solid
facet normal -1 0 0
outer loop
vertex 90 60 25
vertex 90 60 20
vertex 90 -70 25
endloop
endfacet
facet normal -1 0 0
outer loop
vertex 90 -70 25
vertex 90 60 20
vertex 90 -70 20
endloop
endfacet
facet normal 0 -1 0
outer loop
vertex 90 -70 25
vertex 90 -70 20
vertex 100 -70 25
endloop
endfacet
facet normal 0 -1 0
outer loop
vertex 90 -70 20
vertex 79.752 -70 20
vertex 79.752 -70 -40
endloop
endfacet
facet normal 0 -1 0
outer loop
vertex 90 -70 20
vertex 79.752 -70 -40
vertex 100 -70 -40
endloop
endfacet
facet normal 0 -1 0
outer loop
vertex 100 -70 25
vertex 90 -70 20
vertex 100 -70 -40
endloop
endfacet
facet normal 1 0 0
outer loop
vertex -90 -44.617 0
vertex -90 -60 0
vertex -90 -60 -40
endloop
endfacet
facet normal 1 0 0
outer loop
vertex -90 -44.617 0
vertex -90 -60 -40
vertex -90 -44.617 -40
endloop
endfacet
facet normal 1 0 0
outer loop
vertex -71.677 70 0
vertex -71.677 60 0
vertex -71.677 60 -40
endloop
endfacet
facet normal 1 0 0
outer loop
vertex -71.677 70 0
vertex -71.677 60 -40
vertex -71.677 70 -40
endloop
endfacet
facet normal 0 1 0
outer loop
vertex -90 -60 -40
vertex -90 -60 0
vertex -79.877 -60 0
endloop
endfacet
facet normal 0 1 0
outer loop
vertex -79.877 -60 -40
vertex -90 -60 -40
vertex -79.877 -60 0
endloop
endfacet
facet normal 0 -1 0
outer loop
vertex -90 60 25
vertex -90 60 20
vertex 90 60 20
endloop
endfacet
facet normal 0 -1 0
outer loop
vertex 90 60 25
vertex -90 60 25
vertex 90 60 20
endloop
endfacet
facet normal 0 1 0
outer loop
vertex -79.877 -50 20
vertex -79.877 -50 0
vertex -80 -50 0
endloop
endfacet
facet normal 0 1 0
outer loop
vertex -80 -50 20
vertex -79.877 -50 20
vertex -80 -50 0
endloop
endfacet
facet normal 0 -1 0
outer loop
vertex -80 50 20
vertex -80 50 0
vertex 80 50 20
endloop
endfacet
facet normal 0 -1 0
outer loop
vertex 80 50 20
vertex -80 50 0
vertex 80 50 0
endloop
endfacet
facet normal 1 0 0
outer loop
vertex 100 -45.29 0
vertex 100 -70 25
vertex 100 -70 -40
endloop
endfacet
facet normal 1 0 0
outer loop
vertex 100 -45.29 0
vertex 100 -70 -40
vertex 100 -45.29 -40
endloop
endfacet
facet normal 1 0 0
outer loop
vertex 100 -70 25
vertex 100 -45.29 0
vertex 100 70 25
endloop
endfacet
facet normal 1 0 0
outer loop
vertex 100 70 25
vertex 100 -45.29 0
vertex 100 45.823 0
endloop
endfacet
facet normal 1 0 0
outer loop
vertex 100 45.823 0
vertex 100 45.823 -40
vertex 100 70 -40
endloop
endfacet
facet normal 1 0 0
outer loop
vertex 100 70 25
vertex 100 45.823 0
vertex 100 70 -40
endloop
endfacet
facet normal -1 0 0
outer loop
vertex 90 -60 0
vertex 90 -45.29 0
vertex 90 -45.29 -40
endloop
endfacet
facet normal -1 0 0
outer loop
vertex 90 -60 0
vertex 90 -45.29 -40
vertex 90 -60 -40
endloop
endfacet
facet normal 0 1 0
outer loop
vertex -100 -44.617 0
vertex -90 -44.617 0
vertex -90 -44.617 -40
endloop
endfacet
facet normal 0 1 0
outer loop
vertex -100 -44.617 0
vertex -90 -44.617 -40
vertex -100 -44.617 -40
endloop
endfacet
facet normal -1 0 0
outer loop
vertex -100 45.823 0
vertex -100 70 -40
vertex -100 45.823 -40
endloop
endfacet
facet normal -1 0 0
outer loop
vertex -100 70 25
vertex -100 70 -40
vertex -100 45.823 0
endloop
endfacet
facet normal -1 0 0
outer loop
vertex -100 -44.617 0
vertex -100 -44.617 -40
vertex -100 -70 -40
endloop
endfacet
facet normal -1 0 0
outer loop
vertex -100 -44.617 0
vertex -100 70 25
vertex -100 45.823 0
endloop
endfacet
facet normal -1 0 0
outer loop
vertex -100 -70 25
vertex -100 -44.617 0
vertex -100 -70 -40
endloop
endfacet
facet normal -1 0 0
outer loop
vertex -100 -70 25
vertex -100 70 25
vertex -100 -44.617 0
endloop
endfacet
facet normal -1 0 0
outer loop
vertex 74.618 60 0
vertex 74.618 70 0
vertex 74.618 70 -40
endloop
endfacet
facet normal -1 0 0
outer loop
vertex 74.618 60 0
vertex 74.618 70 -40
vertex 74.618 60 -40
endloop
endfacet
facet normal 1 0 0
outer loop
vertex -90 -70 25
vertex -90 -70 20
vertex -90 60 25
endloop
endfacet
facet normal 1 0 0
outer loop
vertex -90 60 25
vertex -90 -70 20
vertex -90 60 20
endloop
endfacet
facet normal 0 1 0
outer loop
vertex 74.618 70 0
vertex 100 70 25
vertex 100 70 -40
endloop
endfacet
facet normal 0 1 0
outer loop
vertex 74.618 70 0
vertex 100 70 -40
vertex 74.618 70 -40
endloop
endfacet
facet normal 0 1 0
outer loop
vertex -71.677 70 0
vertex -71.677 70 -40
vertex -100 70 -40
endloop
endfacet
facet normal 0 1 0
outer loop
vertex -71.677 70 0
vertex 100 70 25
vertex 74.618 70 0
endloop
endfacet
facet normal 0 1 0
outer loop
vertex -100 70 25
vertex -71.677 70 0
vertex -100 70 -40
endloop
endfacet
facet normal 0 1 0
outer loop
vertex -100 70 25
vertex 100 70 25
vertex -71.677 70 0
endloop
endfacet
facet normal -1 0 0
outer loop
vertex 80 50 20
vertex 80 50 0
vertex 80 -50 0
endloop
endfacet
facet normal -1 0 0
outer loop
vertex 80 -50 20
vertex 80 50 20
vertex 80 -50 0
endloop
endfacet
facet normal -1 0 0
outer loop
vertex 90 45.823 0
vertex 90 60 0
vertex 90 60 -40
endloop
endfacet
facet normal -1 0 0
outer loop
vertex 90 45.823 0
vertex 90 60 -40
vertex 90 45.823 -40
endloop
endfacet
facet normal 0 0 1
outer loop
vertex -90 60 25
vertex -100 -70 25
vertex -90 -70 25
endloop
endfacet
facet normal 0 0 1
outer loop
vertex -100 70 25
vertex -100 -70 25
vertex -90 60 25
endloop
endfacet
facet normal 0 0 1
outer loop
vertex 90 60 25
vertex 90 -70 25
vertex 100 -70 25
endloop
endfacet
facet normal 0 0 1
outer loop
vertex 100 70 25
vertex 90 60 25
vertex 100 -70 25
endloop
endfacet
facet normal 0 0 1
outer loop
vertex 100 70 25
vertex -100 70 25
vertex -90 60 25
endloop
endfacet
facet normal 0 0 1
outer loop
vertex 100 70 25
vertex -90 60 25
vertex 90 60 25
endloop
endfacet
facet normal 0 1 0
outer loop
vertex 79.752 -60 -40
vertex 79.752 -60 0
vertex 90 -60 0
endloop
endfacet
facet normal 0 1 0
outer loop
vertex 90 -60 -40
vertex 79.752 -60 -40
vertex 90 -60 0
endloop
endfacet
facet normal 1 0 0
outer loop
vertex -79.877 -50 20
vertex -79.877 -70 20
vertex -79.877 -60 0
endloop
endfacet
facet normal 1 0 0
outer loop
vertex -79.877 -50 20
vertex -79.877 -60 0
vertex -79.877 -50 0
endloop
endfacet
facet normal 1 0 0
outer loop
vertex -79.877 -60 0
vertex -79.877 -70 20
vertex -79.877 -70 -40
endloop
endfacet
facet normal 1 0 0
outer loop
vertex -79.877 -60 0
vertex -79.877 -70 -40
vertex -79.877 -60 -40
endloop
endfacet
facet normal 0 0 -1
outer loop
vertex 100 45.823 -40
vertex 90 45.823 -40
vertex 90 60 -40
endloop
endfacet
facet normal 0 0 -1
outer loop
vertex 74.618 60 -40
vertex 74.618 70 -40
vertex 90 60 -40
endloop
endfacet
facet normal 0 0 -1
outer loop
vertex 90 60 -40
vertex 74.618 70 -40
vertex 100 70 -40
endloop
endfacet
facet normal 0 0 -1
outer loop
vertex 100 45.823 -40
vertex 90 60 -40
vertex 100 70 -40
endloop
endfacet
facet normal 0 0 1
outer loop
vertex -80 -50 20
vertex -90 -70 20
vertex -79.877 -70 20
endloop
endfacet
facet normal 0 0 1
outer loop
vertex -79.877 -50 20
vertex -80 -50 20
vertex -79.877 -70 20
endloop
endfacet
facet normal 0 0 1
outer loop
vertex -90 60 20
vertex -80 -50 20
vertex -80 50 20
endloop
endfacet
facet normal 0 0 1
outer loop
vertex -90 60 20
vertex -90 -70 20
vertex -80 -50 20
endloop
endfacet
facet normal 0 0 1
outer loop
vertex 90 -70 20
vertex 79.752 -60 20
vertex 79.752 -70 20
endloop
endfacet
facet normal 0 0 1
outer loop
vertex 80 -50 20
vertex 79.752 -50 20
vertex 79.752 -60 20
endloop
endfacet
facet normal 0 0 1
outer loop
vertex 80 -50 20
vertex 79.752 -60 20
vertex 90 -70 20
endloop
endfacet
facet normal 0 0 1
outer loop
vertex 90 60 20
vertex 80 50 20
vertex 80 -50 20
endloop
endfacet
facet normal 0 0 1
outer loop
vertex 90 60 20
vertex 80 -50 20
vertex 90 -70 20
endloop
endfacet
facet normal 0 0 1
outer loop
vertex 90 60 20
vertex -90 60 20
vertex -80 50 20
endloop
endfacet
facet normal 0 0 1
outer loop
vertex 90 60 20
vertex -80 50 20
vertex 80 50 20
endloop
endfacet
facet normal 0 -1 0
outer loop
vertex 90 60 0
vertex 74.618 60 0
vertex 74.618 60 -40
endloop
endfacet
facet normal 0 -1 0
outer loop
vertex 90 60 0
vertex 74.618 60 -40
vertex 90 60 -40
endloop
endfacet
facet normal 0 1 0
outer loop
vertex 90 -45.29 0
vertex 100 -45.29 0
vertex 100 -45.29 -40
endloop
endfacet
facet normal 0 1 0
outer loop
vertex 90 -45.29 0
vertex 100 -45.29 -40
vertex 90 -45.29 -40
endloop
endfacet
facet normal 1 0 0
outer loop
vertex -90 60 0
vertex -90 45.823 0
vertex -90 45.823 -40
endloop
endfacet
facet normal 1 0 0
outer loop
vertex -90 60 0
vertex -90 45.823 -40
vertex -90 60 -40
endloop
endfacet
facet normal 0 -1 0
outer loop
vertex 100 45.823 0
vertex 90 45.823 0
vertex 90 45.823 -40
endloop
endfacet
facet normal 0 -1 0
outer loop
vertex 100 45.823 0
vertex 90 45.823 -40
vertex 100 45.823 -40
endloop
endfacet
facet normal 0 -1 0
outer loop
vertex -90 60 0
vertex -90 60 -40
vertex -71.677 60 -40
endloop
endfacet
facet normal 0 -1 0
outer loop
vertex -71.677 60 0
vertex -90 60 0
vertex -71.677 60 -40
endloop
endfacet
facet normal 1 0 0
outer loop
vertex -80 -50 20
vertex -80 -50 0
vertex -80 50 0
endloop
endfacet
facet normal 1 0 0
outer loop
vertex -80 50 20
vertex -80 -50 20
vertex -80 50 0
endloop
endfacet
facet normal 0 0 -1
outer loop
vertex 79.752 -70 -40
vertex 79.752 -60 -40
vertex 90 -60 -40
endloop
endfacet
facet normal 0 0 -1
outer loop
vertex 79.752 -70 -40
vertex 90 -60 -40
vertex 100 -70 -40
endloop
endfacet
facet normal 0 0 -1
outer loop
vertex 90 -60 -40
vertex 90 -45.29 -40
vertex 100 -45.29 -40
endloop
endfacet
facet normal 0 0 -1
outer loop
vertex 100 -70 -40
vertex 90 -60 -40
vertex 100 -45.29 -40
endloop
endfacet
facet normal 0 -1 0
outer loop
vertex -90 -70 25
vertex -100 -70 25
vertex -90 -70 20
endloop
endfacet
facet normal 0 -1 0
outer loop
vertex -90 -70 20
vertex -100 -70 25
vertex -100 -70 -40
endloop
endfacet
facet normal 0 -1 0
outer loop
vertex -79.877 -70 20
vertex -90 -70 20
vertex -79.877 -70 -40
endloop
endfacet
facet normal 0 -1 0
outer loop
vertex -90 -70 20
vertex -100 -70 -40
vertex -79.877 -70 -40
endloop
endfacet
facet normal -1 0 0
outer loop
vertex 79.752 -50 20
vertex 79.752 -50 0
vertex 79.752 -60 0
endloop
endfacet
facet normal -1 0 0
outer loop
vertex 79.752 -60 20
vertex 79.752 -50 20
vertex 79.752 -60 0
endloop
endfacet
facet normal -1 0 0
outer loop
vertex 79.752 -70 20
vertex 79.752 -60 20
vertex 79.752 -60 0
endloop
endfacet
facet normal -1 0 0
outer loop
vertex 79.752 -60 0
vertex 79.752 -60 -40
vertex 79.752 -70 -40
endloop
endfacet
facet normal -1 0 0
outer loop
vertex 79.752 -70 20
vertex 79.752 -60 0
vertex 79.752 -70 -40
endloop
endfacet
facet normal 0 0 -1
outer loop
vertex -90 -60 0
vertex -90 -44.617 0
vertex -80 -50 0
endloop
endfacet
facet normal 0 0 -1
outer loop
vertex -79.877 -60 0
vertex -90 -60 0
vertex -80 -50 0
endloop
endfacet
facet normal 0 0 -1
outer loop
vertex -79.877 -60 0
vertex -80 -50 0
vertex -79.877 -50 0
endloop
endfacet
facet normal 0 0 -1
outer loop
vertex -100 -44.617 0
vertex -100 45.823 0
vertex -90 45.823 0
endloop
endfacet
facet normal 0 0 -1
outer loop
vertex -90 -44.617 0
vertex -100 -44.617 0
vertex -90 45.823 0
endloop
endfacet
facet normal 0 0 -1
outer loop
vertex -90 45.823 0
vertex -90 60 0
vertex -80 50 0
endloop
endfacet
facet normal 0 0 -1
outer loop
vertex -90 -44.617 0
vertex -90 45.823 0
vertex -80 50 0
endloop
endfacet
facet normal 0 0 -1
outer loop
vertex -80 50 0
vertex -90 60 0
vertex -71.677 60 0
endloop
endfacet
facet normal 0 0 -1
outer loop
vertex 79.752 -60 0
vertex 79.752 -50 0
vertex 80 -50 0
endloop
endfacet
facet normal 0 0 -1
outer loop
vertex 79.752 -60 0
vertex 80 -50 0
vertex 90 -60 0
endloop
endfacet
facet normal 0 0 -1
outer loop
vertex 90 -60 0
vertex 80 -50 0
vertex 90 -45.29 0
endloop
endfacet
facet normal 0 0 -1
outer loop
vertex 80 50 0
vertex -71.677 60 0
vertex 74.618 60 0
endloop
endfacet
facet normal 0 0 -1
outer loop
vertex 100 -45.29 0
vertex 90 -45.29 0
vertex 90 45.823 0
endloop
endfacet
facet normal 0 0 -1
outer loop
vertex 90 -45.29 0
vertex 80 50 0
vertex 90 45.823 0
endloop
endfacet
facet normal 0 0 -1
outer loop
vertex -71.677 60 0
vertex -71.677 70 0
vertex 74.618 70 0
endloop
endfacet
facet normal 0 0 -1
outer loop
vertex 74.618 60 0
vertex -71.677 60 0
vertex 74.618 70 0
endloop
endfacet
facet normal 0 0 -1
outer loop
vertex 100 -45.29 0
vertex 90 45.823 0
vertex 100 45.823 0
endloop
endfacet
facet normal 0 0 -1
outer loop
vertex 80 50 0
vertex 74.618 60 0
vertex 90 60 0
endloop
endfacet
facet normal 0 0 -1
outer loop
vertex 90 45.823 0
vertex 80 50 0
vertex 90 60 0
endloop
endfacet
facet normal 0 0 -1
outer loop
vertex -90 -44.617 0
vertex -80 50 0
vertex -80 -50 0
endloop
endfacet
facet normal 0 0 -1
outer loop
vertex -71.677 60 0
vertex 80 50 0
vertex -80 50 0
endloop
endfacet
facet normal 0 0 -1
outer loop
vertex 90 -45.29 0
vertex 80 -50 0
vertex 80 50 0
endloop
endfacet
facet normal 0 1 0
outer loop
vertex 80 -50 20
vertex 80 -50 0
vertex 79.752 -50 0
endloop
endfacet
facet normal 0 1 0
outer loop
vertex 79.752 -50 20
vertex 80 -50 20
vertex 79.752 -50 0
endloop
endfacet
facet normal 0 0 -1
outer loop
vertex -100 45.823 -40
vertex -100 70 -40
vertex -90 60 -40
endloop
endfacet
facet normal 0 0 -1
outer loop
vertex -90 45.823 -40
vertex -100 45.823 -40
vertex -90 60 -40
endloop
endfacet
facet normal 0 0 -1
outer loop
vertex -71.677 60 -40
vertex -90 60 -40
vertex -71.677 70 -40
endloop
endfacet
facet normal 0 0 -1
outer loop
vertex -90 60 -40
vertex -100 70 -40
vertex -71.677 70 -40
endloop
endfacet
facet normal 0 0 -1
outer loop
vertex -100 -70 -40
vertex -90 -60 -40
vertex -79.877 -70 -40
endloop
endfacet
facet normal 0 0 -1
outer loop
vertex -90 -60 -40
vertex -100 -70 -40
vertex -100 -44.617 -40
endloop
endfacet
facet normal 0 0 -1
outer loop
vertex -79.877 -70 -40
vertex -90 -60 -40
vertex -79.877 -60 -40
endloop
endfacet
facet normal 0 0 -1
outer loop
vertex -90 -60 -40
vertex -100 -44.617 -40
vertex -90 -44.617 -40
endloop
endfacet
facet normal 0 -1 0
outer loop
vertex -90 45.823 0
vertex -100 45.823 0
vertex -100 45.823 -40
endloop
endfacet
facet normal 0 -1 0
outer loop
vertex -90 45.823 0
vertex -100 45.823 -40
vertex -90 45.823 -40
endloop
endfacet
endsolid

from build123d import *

# Parameters (mm, degrees)
F0_W     = 10
F0_H     = 91.1132134497
F0_W_2   = 10.2482907567
F0_H_2   = 10
F0_W_3   = 10.1232041232
F0_H_3   = 90.4400162399
F0_W_4   = 146.2950482965
F1_DEPTH = 20
F2_DEPTH = 25
F3_DEPTH = 40


with BuildPart() as f1:
    # F0 (on Top) → F1 (new body)
    with BuildSketch(Plane.XY):
        Polygon((90, 45.8233915269), (100, 45.8233915269), (100, 70), (74.6184438467, 70), (74.6184438467, 60), (90, 60), align=None)
        with Locations((95, 0.2667848021)):
            Rectangle(F0_W, F0_H)
        Polygon((79.7517092433, -60), (90, -60), (90, -45.2898219228), (90, 45.8233915269), (90, 60), (74.6184438467, 60), (-71.6766044497, 60), (-90, 60), (-90, 45.8233915269), (-90, -44.6166247129), (-90, -60), (-79.8767958768, -60), (-79.8767958768, -50), (-80, -50), (-80, 50), (80, 50), (80, -50), (79.7517092433, -50), align=None)
        Polygon((90, -70), (100, -70), (100, -45.2898219228), (90, -45.2898219228), (90, -60), align=None)
        with Locations((84.8758546216, -65)):
            Rectangle(F0_W_2, F0_H_2)
        Polygon((-100, -70), (-90, -70), (-90, -60), (-90, -44.6166247129), (-100, -44.6166247129), align=None)
        with Locations((-84.9383979384, -65)):
            Rectangle(F0_W_3, F0_H_2)
        with Locations((-95, 0.603383407)):
            Rectangle(F0_W, F0_H_3)
        Polygon((-71.6766044497, 60), (-71.6766044497, 70), (-100, 70), (-100, 45.8233915269), (-90, 45.8233915269), (-90, 60), align=None)
        with Locations((1.4709196985, 65)):
            Rectangle(F0_W_4, F0_H_2)
    extrude(amount=F1_DEPTH)

    # F0 (on Top) → F2 (join)
    with BuildSketch(Plane.XY):
        Polygon((-71.6766044497, 60), (-71.6766044497, 70), (-100, 70), (-100, 45.8233915269), (-90, 45.8233915269), (-90, 60), align=None)
        with Locations((-95, 0.603383407)):
            Rectangle(F0_W, F0_H_3)
        Polygon((-100, -70), (-90, -70), (-90, -60), (-90, -44.6166247129), (-100, -44.6166247129), align=None)
        with Locations((1.4709196985, 65)):
            Rectangle(F0_W_4, F0_H_2)
        Polygon((90, 45.8233915269), (100, 45.8233915269), (100, 70), (74.6184438467, 70), (74.6184438467, 60), (90, 60), align=None)
        with Locations((95, 0.2667848021)):
            Rectangle(F0_W, F0_H)
        Polygon((90, -70), (100, -70), (100, -45.2898219228), (90, -45.2898219228), (90, -60), align=None)
    extrude(amount=F2_DEPTH)

    # F0 (on Top) → F3 (join)
    with BuildSketch(Plane.XY):
        Polygon((-71.6766044497, 60), (-71.6766044497, 70), (-100, 70), (-100, 45.8233915269), (-90, 45.8233915269), (-90, 60), align=None)
        Polygon((-100, -70), (-90, -70), (-90, -60), (-90, -44.6166247129), (-100, -44.6166247129), align=None)
        with Locations((-84.9383979384, -65)):
            Rectangle(F0_W_3, F0_H_2)
        with Locations((84.8758546216, -65)):
            Rectangle(F0_W_2, F0_H_2)
        Polygon((90, -70), (100, -70), (100, -45.2898219228), (90, -45.2898219228), (90, -60), align=None)
        Polygon((90, 45.8233915269), (100, 45.8233915269), (100, 70), (74.6184438467, 70), (74.6184438467, 60), (90, 60), align=None)
    extrude(amount=-F3_DEPTH)


solid = f1.part
